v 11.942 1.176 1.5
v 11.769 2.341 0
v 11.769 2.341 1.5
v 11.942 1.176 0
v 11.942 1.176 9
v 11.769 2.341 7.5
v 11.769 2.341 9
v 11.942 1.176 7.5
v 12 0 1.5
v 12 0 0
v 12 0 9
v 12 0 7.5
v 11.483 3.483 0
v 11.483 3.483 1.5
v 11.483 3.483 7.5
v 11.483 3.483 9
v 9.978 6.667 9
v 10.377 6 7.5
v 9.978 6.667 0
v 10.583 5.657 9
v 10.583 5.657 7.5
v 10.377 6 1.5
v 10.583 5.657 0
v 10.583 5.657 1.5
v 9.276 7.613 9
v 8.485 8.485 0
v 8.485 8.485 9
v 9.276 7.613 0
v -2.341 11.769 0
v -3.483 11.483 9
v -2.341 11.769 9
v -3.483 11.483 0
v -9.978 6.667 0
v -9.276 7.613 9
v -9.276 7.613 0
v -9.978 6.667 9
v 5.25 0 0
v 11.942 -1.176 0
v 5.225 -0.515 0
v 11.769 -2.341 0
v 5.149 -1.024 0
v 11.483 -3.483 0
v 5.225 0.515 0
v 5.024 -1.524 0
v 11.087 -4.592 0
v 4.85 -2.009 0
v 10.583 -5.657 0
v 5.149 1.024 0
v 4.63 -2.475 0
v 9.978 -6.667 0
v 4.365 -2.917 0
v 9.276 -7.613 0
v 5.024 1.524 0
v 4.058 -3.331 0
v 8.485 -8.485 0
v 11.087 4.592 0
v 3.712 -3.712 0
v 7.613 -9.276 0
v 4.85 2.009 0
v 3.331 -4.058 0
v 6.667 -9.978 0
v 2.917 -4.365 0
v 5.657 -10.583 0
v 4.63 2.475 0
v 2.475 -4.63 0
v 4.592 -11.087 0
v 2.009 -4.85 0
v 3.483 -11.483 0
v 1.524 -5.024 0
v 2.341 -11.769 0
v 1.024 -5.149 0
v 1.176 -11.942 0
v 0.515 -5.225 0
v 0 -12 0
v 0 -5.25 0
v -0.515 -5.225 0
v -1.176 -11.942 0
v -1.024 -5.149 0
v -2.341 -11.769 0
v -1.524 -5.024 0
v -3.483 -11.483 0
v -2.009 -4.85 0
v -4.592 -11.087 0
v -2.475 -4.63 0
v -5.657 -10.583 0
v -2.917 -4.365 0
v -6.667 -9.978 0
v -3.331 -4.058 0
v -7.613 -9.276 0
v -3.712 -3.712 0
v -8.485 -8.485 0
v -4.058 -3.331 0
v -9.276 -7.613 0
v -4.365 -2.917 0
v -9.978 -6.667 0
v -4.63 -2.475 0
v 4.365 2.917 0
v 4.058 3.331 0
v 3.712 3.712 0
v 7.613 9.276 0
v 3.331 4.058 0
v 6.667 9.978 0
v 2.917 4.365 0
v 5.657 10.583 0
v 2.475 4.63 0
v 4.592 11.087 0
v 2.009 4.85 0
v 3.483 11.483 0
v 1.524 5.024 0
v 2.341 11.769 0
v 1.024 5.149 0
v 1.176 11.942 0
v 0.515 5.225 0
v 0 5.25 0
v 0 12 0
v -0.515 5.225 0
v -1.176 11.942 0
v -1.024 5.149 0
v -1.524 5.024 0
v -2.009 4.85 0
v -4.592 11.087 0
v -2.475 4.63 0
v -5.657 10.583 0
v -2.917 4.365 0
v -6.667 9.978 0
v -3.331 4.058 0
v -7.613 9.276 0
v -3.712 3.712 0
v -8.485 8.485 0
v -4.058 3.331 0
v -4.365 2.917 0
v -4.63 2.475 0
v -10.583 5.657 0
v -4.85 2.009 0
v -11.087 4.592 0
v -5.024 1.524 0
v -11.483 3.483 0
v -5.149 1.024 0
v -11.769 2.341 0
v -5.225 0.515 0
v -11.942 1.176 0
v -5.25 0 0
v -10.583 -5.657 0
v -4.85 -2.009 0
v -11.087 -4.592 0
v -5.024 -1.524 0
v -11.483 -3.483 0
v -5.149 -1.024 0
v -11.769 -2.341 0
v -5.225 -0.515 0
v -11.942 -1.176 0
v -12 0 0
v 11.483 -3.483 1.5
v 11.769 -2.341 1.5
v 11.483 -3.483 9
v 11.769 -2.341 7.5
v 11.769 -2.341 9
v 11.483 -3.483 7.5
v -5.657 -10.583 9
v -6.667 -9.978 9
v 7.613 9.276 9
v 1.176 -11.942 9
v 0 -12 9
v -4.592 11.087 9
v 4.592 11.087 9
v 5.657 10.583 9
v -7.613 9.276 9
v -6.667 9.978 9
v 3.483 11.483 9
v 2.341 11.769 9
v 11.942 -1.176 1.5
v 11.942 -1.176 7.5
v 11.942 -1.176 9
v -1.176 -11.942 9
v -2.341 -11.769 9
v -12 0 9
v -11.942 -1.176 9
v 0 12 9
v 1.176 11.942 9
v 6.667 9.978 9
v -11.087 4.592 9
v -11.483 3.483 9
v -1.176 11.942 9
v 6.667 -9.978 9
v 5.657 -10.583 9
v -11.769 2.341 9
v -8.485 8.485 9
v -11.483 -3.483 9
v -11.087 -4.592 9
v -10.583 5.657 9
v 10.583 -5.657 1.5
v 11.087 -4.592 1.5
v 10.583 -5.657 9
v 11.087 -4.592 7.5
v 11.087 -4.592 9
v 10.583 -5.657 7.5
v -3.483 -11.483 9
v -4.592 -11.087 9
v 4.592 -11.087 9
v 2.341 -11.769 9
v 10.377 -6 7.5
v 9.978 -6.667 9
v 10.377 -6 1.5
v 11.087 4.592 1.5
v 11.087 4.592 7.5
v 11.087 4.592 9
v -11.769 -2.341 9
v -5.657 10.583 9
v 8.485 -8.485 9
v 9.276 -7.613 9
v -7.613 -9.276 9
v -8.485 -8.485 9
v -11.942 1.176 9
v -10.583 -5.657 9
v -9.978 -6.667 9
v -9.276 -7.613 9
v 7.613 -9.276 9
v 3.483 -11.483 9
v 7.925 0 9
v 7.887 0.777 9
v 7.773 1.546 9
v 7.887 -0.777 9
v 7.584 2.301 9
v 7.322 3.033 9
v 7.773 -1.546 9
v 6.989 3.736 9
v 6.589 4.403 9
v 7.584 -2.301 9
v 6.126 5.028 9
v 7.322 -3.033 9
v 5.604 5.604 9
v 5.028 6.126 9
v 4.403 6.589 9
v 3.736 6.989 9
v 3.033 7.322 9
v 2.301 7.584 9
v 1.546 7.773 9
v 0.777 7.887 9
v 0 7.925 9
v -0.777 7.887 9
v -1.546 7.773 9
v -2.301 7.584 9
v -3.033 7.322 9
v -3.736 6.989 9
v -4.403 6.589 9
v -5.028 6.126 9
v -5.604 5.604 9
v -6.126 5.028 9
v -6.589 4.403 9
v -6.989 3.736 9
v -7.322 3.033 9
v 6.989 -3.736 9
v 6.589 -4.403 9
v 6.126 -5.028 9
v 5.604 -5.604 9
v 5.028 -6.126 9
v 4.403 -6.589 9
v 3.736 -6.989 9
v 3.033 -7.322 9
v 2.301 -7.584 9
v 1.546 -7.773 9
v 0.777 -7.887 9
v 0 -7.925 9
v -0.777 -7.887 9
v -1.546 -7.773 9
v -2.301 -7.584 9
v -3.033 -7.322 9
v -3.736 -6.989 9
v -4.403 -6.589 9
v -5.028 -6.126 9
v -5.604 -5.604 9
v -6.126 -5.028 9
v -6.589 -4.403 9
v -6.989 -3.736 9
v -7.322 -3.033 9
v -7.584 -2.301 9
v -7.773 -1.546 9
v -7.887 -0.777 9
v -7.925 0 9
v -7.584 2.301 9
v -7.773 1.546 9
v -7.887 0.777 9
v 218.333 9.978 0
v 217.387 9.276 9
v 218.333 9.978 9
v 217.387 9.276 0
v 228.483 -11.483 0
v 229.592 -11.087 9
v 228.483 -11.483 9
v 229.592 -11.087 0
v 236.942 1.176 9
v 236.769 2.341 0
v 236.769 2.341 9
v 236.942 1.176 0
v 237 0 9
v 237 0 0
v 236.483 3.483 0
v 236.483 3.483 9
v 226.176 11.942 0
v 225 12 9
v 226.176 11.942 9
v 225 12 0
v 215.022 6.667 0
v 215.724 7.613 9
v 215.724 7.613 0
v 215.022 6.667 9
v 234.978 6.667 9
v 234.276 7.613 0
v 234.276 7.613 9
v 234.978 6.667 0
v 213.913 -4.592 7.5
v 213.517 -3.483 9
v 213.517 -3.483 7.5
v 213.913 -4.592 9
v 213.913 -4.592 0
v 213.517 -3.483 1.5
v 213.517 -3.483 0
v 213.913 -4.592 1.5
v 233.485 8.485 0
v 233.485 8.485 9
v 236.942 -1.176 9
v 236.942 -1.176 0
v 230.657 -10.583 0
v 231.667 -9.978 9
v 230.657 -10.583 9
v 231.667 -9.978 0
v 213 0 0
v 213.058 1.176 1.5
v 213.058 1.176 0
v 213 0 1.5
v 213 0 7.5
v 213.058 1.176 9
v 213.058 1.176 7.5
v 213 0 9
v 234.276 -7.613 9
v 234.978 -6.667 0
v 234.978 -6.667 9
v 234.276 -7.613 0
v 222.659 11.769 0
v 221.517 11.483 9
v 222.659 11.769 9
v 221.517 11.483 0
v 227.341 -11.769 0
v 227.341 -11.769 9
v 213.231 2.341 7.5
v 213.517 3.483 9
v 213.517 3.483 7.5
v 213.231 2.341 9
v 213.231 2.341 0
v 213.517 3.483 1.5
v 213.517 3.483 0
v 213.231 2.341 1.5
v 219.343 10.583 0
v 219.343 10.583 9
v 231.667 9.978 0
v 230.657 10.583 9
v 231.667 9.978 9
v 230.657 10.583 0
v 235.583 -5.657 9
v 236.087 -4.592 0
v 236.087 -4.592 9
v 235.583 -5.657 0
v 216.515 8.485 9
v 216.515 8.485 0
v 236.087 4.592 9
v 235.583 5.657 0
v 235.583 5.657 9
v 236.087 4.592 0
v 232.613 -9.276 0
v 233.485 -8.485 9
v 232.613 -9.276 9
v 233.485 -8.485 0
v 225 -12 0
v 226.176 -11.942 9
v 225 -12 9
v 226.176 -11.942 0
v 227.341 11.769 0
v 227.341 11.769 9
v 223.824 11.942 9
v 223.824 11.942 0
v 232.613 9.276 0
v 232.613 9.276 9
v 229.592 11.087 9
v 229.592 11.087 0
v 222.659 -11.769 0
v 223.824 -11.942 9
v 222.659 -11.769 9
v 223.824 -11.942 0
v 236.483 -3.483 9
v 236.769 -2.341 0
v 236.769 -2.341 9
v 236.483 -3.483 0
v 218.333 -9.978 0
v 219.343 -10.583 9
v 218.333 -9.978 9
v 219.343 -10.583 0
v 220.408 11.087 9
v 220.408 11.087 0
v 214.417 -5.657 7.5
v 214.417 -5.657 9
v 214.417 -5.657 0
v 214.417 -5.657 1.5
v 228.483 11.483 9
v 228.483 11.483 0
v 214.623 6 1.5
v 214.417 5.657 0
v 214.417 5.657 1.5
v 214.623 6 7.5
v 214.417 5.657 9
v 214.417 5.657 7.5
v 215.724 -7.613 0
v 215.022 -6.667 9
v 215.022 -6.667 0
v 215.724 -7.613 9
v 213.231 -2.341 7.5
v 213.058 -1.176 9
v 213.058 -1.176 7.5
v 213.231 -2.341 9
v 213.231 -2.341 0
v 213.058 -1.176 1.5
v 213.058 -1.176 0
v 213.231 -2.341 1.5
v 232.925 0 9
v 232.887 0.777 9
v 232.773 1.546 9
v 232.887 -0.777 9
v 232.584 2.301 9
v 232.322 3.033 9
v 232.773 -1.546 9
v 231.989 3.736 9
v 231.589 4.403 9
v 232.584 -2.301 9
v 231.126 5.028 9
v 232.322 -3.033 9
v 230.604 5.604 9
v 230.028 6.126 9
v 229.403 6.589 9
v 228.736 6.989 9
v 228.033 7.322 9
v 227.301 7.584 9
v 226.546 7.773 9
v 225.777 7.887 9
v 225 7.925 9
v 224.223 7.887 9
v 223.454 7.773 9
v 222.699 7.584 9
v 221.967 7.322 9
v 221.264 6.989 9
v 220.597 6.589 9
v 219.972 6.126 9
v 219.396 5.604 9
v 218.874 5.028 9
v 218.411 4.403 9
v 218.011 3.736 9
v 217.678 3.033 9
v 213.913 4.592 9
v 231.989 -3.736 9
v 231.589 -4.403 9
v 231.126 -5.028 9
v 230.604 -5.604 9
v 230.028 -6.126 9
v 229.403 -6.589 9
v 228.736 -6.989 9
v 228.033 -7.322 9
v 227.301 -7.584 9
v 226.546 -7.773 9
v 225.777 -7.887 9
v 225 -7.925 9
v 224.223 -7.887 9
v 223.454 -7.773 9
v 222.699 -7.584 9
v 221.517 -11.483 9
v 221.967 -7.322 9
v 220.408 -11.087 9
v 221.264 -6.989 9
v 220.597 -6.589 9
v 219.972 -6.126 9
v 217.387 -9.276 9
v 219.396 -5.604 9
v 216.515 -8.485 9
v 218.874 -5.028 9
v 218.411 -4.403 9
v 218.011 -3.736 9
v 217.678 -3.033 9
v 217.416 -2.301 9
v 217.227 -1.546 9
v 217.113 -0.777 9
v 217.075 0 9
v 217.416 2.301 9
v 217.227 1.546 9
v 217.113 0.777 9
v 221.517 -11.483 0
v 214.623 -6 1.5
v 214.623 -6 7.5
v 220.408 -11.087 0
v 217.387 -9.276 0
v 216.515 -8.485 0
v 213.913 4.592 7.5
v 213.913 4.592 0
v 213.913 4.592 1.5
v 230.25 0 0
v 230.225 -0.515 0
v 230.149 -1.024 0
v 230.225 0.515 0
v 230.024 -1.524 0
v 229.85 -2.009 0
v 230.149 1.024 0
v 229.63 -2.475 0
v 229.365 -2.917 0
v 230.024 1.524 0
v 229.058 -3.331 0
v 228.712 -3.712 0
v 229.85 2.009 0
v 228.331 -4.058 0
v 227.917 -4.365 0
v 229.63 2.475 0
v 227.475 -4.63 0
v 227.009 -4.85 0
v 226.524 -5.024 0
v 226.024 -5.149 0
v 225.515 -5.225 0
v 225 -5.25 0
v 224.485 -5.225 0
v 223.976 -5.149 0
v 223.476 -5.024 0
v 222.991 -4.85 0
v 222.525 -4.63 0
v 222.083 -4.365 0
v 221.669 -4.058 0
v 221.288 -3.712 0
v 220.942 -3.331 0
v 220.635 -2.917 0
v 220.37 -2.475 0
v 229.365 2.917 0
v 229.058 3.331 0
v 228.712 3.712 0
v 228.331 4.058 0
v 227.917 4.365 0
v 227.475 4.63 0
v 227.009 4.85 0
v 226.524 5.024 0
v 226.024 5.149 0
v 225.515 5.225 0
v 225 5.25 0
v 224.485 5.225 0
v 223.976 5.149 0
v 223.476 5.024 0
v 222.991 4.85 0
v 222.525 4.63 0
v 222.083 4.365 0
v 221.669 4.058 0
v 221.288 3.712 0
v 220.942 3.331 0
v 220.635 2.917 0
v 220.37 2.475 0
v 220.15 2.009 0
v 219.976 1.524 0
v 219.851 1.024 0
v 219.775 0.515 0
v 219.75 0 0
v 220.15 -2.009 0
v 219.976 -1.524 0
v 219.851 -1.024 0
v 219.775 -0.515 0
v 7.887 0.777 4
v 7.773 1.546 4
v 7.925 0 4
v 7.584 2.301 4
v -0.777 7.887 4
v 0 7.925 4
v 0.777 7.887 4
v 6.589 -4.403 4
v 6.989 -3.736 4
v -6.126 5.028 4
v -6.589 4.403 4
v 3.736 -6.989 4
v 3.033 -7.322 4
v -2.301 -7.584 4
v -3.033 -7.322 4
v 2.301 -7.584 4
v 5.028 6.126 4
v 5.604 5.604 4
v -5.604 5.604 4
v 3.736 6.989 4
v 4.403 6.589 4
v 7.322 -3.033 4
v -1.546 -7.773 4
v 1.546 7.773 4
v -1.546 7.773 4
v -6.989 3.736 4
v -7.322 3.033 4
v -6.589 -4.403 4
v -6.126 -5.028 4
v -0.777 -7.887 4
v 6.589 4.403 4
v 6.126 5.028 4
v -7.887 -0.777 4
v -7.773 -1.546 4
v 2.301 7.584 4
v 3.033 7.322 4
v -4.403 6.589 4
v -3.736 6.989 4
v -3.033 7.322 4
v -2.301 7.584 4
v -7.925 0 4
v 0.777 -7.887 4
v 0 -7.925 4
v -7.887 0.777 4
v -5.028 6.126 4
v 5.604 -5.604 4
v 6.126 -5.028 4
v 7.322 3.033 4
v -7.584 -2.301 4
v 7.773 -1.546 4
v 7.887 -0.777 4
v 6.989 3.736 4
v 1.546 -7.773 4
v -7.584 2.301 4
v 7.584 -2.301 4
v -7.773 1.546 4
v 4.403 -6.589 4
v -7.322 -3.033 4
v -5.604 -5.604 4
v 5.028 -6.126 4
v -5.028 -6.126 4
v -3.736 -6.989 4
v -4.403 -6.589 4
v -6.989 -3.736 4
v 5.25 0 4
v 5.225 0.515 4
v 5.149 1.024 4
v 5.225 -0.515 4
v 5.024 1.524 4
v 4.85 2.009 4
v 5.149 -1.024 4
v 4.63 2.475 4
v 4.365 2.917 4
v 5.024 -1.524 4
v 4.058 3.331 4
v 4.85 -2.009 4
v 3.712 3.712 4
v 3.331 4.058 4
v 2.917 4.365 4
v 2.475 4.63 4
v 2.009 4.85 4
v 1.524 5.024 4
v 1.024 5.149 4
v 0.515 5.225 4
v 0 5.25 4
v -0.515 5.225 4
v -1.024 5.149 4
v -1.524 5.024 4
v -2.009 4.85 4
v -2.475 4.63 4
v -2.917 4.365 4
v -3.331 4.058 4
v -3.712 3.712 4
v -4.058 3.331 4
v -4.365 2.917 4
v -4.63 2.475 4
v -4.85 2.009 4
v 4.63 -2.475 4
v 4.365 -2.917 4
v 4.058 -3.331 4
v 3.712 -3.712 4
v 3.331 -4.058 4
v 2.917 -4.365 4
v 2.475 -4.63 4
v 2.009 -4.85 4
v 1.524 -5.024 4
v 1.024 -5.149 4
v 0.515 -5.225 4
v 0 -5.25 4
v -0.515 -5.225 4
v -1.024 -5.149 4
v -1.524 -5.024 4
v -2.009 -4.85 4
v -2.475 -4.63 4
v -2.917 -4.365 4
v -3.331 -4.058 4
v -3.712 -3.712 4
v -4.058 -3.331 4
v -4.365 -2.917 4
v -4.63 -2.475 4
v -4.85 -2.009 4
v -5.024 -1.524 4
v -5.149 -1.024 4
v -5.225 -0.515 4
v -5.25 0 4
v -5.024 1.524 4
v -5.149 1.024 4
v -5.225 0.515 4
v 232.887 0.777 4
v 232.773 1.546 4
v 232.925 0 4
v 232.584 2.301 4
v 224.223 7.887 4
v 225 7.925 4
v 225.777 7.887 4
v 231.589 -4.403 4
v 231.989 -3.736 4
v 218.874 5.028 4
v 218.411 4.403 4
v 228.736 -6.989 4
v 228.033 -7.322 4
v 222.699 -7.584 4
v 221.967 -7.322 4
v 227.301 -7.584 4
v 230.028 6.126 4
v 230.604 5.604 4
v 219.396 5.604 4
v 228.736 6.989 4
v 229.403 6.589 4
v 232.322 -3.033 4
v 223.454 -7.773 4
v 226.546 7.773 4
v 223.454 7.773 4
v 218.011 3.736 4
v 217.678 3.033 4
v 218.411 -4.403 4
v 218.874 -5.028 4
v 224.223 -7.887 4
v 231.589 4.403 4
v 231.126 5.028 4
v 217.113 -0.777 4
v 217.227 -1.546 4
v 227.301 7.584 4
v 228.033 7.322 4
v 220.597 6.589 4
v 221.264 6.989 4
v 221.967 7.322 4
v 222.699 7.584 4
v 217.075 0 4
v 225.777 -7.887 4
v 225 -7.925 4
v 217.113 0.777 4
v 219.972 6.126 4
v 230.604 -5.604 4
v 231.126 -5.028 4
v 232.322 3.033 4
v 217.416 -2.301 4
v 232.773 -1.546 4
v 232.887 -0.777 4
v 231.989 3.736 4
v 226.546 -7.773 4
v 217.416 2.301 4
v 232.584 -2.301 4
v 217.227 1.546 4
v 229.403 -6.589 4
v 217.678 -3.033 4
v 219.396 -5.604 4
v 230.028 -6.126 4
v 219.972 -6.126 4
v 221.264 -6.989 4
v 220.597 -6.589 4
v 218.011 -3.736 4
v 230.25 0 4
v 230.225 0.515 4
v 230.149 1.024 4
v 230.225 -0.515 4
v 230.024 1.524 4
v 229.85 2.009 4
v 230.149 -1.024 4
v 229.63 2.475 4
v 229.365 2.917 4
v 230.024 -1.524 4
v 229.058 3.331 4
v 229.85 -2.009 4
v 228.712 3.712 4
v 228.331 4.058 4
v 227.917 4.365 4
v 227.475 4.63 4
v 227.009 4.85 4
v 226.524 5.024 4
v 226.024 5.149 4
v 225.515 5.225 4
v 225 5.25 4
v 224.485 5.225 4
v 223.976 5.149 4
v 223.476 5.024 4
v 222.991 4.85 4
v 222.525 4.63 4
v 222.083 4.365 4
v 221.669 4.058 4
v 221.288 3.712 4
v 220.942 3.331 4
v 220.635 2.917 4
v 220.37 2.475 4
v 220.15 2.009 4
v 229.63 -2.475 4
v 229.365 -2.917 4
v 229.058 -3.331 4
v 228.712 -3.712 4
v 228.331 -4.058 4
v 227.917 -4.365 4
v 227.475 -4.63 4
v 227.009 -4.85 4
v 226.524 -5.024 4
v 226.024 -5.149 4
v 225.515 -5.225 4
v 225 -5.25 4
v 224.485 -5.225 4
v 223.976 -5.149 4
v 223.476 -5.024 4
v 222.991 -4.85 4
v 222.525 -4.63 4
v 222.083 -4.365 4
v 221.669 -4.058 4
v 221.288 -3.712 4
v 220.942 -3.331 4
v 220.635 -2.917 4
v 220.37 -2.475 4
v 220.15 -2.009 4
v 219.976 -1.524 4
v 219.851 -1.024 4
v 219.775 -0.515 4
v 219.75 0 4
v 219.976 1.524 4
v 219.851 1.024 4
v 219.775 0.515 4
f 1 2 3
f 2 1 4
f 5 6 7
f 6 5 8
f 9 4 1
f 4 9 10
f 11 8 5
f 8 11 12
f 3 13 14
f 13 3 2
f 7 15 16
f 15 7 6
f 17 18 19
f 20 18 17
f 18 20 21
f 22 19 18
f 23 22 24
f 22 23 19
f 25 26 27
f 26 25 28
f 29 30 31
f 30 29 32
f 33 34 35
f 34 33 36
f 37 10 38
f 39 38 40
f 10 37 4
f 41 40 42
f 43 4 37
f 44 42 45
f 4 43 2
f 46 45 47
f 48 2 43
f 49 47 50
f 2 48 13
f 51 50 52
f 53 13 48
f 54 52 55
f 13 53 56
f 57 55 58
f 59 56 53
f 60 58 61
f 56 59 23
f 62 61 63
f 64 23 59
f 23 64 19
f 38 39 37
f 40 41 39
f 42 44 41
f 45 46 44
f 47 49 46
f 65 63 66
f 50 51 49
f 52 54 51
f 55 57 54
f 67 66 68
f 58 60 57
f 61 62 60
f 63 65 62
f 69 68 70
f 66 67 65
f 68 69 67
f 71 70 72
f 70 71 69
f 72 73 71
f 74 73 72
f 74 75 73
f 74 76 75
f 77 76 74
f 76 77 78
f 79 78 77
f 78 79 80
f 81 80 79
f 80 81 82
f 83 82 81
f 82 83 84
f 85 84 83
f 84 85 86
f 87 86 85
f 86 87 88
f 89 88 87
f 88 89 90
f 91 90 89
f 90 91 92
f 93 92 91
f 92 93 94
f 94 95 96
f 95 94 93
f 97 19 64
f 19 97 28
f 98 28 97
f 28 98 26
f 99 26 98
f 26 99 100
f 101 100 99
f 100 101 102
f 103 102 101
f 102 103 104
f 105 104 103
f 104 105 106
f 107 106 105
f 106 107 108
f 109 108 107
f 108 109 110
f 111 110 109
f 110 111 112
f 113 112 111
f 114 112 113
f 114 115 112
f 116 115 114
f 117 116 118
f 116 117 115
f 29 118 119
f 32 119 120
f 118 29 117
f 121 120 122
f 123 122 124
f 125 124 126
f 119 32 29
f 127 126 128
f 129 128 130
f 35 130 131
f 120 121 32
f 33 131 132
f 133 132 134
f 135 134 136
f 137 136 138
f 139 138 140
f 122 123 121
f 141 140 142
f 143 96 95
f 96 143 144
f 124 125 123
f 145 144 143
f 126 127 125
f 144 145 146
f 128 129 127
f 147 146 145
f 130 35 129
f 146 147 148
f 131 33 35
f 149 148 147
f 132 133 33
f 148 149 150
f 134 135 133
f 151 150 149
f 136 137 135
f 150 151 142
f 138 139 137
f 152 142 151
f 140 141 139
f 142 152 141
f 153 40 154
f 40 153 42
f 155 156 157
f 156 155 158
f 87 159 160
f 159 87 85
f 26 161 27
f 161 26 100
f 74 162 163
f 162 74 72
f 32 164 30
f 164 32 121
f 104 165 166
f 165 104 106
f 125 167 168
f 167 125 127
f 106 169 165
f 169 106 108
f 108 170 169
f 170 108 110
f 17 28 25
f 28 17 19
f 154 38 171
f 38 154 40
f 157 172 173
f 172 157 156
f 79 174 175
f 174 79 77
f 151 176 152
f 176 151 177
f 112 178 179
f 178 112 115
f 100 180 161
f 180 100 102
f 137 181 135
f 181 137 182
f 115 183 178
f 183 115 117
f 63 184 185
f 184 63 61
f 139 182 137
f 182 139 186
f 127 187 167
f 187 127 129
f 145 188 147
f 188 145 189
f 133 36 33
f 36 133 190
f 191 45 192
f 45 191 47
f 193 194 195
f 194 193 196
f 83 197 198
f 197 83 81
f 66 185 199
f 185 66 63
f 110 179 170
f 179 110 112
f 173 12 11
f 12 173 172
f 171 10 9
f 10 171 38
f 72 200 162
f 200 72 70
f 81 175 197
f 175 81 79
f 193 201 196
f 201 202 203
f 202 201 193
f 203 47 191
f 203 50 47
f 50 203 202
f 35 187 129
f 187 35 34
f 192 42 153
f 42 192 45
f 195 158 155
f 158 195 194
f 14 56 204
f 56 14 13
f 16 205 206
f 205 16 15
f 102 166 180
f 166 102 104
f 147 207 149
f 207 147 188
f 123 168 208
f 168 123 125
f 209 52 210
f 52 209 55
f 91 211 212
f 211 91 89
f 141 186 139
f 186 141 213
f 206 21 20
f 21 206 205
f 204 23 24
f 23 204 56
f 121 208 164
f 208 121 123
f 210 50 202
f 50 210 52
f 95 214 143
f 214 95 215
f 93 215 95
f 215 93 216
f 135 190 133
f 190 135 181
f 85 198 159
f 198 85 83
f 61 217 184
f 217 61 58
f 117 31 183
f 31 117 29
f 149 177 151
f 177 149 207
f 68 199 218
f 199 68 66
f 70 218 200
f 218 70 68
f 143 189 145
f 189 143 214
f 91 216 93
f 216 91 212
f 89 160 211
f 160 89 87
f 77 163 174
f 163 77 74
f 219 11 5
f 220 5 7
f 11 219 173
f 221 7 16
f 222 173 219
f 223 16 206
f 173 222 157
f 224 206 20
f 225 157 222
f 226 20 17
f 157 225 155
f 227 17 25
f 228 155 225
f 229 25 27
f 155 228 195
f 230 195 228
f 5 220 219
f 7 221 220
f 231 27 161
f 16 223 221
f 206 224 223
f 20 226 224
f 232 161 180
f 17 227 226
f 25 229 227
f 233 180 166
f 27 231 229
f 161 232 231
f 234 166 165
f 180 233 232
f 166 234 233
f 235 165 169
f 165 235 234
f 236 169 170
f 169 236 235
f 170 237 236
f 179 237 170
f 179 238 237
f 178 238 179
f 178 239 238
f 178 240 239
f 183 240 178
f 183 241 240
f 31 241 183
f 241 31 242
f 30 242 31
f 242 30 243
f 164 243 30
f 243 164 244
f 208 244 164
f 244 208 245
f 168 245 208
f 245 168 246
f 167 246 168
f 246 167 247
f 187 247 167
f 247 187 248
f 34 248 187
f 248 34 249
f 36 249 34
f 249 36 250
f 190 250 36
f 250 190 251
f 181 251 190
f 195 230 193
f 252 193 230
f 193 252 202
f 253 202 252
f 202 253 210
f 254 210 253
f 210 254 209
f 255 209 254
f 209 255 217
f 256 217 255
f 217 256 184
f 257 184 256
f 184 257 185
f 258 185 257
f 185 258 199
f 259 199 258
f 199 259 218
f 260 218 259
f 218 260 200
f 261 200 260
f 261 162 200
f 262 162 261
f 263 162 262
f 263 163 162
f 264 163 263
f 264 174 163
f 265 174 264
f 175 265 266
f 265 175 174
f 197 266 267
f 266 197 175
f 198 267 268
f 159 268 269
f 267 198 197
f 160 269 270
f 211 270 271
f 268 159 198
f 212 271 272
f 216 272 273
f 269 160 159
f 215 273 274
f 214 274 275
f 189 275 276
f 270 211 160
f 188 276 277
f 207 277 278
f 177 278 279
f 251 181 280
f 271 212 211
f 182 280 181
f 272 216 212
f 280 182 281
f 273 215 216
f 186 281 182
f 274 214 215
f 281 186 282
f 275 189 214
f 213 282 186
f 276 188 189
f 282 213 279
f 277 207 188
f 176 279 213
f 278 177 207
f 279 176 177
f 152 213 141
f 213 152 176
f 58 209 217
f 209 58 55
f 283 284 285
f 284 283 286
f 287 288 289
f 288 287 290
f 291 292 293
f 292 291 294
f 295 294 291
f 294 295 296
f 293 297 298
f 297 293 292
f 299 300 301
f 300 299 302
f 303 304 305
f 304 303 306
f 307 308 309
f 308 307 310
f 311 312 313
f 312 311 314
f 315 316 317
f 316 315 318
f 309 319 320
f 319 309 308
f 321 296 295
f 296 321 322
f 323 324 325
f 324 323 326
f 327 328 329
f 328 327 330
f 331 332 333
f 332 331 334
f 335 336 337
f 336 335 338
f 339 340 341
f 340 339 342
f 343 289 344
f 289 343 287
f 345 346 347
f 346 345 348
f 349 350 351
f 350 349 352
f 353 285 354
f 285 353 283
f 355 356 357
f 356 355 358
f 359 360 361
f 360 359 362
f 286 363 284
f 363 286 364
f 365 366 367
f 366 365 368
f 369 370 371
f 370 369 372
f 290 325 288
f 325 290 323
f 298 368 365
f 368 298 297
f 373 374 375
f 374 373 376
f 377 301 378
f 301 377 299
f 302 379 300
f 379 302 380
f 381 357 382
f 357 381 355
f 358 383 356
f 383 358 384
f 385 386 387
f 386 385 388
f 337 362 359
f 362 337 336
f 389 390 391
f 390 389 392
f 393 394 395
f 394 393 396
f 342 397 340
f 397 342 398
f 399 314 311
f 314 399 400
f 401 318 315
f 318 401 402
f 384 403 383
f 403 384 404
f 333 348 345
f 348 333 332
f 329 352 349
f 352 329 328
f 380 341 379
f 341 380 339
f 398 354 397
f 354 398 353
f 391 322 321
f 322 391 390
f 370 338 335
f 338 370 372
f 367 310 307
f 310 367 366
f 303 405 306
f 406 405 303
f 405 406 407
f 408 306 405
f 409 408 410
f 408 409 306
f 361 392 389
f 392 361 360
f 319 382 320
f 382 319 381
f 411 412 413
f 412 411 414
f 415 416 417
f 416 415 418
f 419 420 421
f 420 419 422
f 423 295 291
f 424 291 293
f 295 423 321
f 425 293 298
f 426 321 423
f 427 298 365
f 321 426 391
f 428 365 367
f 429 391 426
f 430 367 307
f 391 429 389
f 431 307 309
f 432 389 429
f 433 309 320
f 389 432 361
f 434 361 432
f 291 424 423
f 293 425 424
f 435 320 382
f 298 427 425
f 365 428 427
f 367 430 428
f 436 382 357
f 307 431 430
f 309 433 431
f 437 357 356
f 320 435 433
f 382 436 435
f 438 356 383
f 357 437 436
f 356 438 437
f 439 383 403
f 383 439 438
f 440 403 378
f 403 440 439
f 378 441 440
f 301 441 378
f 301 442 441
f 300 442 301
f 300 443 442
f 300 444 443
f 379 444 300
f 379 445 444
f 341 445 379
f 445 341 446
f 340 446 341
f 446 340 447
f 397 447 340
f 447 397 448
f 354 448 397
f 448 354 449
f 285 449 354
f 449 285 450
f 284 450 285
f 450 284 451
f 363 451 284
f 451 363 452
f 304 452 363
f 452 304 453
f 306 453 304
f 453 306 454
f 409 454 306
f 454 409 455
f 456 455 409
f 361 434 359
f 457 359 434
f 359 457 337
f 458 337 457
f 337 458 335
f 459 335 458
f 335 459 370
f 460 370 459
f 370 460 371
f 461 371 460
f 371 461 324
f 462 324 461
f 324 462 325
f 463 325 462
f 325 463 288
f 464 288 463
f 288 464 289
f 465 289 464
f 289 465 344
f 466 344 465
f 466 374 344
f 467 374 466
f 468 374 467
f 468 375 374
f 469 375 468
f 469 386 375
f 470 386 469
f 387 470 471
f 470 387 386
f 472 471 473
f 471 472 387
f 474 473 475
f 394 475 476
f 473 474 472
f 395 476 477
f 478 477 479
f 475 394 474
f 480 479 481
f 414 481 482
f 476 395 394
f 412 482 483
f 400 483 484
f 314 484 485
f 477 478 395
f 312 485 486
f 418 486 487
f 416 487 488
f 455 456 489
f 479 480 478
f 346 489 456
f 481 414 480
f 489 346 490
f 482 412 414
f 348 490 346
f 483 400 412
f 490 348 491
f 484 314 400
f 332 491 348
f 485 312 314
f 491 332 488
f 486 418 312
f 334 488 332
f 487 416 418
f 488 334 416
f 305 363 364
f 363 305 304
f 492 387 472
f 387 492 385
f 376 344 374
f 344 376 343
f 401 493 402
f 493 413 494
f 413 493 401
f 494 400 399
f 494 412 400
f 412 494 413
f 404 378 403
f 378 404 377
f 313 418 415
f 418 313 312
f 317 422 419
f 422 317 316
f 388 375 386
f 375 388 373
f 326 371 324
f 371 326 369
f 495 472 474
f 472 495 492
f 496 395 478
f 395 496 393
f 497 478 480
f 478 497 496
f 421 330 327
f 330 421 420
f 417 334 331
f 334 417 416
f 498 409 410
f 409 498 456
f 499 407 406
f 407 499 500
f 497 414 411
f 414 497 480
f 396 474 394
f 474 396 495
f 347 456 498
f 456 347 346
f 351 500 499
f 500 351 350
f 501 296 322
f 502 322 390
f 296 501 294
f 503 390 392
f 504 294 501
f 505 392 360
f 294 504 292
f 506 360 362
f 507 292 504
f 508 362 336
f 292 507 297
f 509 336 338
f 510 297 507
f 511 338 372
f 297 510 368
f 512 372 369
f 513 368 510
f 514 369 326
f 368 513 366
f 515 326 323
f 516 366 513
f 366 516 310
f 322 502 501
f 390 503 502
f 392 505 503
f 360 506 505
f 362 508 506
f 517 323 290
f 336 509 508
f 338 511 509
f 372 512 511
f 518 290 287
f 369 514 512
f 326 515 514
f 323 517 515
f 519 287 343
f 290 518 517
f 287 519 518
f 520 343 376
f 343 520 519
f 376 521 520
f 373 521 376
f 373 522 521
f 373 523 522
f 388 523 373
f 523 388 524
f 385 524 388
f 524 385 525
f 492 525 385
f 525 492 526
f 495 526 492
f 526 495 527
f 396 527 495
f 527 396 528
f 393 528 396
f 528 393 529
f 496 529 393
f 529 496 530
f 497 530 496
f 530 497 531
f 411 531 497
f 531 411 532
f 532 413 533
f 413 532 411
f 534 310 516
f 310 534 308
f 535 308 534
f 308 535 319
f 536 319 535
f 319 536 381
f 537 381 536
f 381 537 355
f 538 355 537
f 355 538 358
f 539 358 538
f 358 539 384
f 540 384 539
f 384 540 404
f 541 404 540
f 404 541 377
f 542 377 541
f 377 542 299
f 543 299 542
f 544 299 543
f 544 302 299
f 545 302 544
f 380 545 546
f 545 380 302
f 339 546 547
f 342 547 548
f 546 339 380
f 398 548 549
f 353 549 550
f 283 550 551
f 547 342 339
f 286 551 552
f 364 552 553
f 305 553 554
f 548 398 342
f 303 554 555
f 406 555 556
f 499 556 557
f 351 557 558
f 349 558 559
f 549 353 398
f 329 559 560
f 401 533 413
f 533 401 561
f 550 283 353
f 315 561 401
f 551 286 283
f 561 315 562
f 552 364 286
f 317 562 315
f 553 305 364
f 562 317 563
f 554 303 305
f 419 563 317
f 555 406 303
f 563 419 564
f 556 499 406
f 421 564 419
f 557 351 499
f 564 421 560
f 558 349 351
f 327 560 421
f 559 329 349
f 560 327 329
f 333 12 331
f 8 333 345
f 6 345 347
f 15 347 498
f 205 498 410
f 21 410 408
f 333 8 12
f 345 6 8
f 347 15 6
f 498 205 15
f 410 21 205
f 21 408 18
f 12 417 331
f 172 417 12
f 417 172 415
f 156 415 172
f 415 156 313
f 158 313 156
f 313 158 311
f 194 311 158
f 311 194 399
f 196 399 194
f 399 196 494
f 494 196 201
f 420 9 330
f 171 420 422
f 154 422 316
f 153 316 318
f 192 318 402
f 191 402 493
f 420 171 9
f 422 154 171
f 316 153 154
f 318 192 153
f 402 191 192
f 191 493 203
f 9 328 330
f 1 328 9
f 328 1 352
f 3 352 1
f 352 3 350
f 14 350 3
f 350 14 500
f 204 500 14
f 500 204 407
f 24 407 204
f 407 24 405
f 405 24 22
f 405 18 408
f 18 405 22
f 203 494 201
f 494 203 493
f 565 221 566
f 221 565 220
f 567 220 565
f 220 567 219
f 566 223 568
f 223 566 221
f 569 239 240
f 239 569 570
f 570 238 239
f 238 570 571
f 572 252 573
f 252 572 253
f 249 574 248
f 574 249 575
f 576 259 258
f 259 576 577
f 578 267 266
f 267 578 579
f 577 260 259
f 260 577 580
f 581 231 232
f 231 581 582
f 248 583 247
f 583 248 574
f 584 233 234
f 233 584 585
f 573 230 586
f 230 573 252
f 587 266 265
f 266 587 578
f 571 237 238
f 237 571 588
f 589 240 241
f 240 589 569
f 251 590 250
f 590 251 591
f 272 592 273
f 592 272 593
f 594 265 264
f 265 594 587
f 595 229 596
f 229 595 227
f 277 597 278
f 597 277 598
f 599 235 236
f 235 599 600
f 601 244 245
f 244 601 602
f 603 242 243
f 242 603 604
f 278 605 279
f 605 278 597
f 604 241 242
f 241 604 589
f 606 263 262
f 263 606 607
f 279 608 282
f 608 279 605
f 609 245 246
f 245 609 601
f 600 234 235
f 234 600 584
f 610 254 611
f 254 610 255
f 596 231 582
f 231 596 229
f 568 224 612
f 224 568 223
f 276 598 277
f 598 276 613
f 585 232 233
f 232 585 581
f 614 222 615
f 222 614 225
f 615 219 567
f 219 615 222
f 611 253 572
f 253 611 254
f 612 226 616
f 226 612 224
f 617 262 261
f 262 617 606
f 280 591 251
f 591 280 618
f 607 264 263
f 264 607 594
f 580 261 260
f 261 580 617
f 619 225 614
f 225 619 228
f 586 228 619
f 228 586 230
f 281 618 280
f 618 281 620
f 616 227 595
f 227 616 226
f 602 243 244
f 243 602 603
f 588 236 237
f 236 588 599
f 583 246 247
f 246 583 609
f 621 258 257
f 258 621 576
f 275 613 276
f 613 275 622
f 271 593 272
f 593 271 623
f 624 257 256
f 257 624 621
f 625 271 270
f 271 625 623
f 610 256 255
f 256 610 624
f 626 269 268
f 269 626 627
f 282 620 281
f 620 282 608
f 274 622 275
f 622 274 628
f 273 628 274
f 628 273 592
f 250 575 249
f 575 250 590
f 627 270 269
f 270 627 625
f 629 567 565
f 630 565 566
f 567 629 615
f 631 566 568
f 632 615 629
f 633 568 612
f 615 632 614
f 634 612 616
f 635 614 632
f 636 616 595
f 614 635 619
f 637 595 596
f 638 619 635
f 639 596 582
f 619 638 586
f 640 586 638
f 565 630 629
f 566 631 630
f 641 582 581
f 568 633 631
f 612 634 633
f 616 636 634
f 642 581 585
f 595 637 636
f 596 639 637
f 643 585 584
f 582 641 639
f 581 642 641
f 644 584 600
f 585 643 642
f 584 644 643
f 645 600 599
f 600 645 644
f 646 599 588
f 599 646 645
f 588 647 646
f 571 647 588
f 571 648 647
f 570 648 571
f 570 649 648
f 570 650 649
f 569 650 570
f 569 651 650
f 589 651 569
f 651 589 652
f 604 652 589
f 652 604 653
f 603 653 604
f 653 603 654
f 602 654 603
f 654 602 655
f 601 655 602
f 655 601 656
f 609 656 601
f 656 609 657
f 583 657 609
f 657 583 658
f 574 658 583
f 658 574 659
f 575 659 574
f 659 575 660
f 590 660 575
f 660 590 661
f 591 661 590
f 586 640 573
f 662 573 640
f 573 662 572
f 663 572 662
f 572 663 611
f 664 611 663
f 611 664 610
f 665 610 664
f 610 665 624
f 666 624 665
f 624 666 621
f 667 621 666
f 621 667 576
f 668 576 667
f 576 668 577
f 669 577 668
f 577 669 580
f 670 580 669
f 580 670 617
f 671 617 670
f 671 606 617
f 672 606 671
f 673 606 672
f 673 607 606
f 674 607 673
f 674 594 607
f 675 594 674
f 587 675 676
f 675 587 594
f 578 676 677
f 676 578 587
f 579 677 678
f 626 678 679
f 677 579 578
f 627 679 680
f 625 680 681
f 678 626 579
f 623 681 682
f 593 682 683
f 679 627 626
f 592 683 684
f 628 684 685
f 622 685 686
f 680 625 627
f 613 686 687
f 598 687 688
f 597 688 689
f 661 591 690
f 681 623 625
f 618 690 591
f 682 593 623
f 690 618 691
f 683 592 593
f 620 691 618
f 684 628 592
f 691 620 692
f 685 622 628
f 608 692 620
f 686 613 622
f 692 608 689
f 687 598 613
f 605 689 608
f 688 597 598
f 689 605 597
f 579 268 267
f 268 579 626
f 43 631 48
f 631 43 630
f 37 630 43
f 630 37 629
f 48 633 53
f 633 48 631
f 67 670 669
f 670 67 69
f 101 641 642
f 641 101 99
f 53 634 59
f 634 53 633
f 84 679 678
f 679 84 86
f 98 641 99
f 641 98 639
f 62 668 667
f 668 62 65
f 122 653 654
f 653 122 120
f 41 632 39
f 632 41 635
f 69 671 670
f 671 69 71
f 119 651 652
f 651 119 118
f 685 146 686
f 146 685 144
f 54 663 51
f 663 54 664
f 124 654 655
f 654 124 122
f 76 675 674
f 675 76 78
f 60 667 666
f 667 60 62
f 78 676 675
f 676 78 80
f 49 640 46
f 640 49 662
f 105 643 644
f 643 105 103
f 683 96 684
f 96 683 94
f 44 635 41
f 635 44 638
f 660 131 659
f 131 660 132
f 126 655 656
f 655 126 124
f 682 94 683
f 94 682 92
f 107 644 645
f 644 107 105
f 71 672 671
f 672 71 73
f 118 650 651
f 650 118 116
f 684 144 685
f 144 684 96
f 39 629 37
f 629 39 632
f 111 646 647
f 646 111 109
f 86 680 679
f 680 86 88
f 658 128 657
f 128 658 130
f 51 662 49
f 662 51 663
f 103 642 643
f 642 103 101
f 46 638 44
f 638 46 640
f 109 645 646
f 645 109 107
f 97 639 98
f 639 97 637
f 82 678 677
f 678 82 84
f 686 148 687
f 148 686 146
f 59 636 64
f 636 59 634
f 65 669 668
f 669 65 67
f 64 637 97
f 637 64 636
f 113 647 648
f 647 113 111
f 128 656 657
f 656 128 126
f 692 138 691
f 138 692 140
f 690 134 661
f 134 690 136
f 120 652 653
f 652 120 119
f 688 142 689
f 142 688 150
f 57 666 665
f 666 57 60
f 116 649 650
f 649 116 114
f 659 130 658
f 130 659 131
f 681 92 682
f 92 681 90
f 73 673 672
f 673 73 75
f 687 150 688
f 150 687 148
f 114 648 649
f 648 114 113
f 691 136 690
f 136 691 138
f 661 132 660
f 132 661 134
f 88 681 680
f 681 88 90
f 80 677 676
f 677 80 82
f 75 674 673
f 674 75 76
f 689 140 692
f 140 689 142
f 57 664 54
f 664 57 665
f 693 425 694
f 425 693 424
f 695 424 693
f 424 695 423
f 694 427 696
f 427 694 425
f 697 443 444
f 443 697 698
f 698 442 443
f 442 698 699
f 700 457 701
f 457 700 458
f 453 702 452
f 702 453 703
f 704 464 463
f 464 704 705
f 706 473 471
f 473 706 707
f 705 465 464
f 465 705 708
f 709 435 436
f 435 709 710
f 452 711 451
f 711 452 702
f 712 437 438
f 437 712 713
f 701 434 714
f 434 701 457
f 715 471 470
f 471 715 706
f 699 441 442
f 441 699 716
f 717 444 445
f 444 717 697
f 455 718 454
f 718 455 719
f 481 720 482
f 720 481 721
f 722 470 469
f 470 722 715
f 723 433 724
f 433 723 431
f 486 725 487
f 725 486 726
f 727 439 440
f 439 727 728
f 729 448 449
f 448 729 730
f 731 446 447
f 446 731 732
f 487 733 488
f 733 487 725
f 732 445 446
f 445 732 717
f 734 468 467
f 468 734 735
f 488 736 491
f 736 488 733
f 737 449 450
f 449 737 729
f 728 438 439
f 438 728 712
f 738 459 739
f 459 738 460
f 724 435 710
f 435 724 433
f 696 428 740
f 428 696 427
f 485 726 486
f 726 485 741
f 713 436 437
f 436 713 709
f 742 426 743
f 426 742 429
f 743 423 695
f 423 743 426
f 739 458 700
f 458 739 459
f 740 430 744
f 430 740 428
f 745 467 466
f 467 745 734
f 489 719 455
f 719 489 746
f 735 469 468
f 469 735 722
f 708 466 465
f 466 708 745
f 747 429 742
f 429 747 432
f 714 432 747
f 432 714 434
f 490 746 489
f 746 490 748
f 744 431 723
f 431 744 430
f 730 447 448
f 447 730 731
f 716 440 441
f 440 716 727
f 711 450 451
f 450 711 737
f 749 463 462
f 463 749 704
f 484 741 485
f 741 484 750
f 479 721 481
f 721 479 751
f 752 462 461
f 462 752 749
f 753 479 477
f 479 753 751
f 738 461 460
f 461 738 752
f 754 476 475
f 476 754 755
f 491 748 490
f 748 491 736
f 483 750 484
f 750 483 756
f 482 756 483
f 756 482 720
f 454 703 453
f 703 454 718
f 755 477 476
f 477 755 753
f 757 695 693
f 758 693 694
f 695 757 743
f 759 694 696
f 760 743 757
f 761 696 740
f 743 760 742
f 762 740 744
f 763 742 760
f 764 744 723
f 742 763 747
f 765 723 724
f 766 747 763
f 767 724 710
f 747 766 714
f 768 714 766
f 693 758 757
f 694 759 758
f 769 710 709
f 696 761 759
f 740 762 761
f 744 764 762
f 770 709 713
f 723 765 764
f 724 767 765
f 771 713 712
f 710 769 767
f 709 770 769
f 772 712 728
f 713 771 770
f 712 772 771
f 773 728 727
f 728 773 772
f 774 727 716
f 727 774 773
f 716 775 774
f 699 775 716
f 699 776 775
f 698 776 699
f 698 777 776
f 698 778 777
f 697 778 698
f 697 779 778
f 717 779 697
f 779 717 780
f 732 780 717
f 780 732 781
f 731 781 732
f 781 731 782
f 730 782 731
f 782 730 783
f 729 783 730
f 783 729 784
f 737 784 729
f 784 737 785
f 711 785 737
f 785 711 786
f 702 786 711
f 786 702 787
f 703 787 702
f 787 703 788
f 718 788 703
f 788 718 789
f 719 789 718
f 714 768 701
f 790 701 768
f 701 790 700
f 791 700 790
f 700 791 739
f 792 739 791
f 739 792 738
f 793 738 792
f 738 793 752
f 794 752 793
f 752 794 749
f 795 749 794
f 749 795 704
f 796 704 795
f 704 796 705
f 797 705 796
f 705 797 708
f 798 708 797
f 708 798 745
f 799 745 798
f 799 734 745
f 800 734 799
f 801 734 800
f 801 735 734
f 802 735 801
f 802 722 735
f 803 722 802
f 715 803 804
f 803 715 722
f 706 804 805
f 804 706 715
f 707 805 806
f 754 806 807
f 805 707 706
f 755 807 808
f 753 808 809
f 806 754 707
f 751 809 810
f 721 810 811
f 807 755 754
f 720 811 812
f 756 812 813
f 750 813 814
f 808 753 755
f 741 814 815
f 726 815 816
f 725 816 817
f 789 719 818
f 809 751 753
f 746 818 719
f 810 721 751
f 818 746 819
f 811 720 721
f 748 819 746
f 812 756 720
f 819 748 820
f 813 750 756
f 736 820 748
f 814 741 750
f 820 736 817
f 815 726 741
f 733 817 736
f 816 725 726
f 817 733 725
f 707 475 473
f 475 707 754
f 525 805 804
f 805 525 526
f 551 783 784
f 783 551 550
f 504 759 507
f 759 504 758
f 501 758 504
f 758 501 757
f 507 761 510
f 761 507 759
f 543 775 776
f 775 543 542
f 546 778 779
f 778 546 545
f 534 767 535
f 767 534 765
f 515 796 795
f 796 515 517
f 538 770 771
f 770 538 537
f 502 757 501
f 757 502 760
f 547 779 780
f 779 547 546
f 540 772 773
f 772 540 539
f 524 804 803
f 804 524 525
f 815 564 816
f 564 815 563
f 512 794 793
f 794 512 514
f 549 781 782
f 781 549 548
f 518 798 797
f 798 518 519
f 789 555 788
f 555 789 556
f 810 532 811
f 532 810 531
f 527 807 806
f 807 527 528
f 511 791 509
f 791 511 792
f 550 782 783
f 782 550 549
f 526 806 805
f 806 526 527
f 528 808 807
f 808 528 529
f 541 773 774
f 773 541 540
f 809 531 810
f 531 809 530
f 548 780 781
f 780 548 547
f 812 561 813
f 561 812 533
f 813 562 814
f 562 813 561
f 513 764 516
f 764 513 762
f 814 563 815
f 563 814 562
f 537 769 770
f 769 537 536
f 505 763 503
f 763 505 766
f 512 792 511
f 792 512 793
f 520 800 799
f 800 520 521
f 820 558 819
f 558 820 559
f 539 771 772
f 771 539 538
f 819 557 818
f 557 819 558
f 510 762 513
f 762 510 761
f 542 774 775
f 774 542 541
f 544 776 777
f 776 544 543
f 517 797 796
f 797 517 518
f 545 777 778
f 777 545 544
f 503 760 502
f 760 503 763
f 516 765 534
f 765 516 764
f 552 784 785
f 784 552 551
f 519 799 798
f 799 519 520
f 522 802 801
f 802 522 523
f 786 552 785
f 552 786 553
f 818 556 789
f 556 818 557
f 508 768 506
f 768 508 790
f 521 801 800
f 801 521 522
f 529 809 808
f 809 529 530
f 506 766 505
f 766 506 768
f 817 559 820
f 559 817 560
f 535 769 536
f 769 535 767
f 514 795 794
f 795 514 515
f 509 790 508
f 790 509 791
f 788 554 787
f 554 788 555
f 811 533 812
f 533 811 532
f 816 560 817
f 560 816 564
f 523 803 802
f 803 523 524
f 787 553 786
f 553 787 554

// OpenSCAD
// file: ../lib/utils.scad
// 공통 모듈 (common modules) — 베어링 시트, 볼트 홀 등
include <../config/parameters.scad>

// 베어링 시트 (bearing seat): 압입 공차 적용 포켓
// brg = [내경, 외경, 폭] (예: BRG_608ZZ)
module bearing_seat(brg) {
    cylinder(d = brg[1] + bearing_press_fit, h = brg[2]);
}

// 베어링 시트 + 내륜 도피 홀 (관통)
// wall = 시트 아래 받침 두께
module bearing_pocket(brg, wall = 2) {
    union() {
        translate([0, 0, wall]) bearing_seat(brg);
        // 내륜 접촉 방지: 내경보다 크고 외경보다 작은 도피 홀
        cylinder(d = (brg[0] + brg[1]) / 2, h = wall + 0.1);
    }
}

// 관통 볼트 홀 (clearance hole)
module bolt_hole(d, h) {
    cylinder(d = d + bolt_hole_oversize, h = h);
}

// NEMA 17 모터 마운트 홀 패턴 (CON-004: SF24 = 42각 NEMA 17 호환)
// h = 판 두께
module nema17_mount(h) {
    union() {
        cylinder(d = nema17_pilot_d + clearance_fit, h = h);
        for (x = [-1, 1], y = [-1, 1])
            translate([x * nema17_hole_pitch / 2, y * nema17_hole_pitch / 2, 0])
                bolt_hole(nema17_bolt_d, h);
    }
}

// 숄더 볼트 피벗 홀 (CON-001)
// d = 숄더 직경 (shoulder_d_small | shoulder_d_large)
module pivot_hole(d, h) {
    cylinder(d = d + clearance_fit, h = h);
}

// 베어링 보스 (bearing boss): 출력물 허브에 베어링 내경 직접 안착 (CON-003)
// 내경 기준 압입 — bearing_press_fit(음수)만큼 키운다
module bearing_boss(brg, h) {
    cylinder(d = brg[0] - bearing_press_fit, h = h);
}

// 육각 너트 포켓 (nut pocket) — 차집합용. af = 평면폭(across flats)
module nut_pocket(af, t) {
    cylinder(d = (af + clearance_fit) / cos(30), h = t, $fn = 6);
}

// 리미트 스위치 장착 홀 쌍 (ELE-004) — 차집합용, X축 방향 피치
module ls_mount_holes(h) {
    for (x = [-1, 1])
        translate([x * ls_hole_pitch / 2, 0, 0])
            cylinder(d = ls_hole_d, h = h);
}

// 케이블 가이드 클립 (ELE-005) — 외면 부착형 C-클립, cable_d 다발 직경
module cable_clip(cable_d = 8, t = 4) {
    wall = 2.5;
    difference() {
        cylinder(d = cable_d + 2 * wall, h = t);
        translate([0, 0, -0.1]) cylinder(d = cable_d, h = t + 0.2);
        // 삽입 개구 (개구 폭 = 케이블 직경의 70%)
        translate([0, -cable_d * 0.35, -0.1])
            cube([cable_d, cable_d * 0.7, t + 0.2]);
    }
}

// 평행/구동 링크 바 (625ZZ 양단, MEC-002/MEC-001a)
// len = 피벗 간 거리. 보스 상면에서 베어링 압입, 하면 내륜 도피 홀.
module link_bar(len) {
    boss_t = BRG_625ZZ[2] + 4;
    difference() {
        union() {
            translate([0, -link_bar_w / 2, (boss_t - link_bar_t) / 2])
                cube([len, link_bar_w, link_bar_t]);
            for (x = [0, len])
                translate([x, 0, 0]) cylinder(d = link_boss_d, h = boss_t);
        }
        for (x = [0, len]) {
            translate([x, 0, boss_t - BRG_625ZZ[2]])
                bearing_seat([BRG_625ZZ[0], BRG_625ZZ[1], BRG_625ZZ[2] + 0.1]);
            translate([x, 0, -0.1])
                cylinder(d = (BRG_625ZZ[0] + BRG_625ZZ[1]) / 2, h = boss_t + 0.2);
        }
    }
}

// 지시선(leader) + 빌보드(billboard) 라벨 — 프리뷰용, $vpr 카메라 추종
// p = 앵커(부품 측), v = 지시선 벡터 (라벨은 p+v 위치)
// 주의: 상위 프레임이 회전된 경우 빌보드가 카메라를 향하지 않음 — 월드 프레임에서 호출할 것
module leader_label(p, v, txt, size = 3.2, col = "white") {
    color(col) {
        hull() {
            translate(p) sphere(d = 1.4, $fn = 12);
            translate(p + v) sphere(d = 1.4, $fn = 12);
        }
        translate(p + v) rotate($vpr) translate([2, -size / 2, 0])
            linear_extrude(0.6) text(txt, size = size);
    }
}

// 축 클램프 슬릿 + M3 핀치 볼트 (차집합용)
// bore_d = 클램프 보어, depth = 보어 깊이, body_d = 보스 외경
module shaft_clamp_cut(bore_d, depth, body_d) {
    union() {
        cylinder(d = bore_d + clearance_fit / 2, h = depth);
        // 슬릿
        translate([-1, 0, -0.1]) cube([2, body_d / 2 + 1, depth + 0.1]);
        // M3 핀치 볼트 (슬릿 직교) — 보어 반경과 보스 반경 사이
        translate([0, (bore_d / 2 + body_d / 2) / 2 + 1, depth / 2])
            rotate([0, 90, 0])
                translate([0, 0, -body_d / 2 - 1])
                    bolt_hole(3, body_d + 2);
    }
}
// file: ../config/parameters.scad
// cobot-lite 전역 파라미터 (global parameters)
// 모든 부품 치수는 이 파일에서만 정의한다 — 매직 넘버 하드코딩 금지 (MEC-008)

/* ===== 출력/렌더링 ===== */
$fn = 64;

/* ===== 공통 가공 여유 (파생 치수에서 참조 — 선행 정의 필수) ===== */
clearance_fit = 0.3;      // 회전/슬라이드 끼움 여유
bolt_hole_oversize = 0.4; // 관통 볼트 홀 여유

/* ===== 베어링 (bearing) — CON-002: 이 4종만 사용 =====
   [내경, 외경, 폭] mm */
BRG_608ZZ  = [8,  22, 7];   // 관절 피벗 (8mm 숄더 볼트)
BRG_625ZZ  = [5,  16, 5];   // 평행 링크 피벗 (5mm 숄더 볼트)
BRG_6805ZZ = [25, 37, 7];   // 손목 롤 축, 중구경 허브
BRG_6810ZZ = [50, 65, 7];   // 베이스 턴테이블 메인 베어링

// 베어링 압입 공차 (press-fit tolerance) — MFG-002
// 외경 기준 -0.1 ~ -0.2mm. 프린터별 보정은 이 변수 하나로 조정한다.
bearing_press_fit = -0.15;

/* ===== 숄더 볼트 (stripper/shoulder bolt) — CON-001 ===== */
shoulder_d_small = 5;   // 625ZZ 결합
shoulder_d_large = 8;   // 608ZZ 결합

/* ===== 링크 길이 — MEC-006 [TBD-4] =====
   리치 500mm 잠정. 비대칭 분할 (J2 자중 부담 보상, MEC-001a 분담 구조) */
L1 = 225;   // 상완 (upper arm): J2 축 → J3 축
L2 = 275;   // 하완 (forearm): J3 축 → 공구 플랜지

/* ===== 링크 꺾임 (팔레타이저식 구조 오프셋) =====
   관절 축 좌표는 불변(직선 L1/L2 기준) — 꺾임은 빔 형상만 변경.
   목적: ① 신장/접힘 한계 자세에서 빔-빔 간섭 여유 확보
        ② 구조 외곽을 축선 위로 올려 저자세 작업 시 팔꿈치 하부 돌출 감소
   니(knee) 수직 오프셋 h = L·pos·(1-pos)·tan(deg) */
ua_bend_deg = 12;     // 상완 꺾임각 (0 = 직선)
ua_bend_pos = 0.68;   // 꺾임 위치 (0~1, J2 기준) — 분할 조인트(95~131) 뒤
fa_bend_deg = 12;     // 하완 꺾임각
fa_bend_pos = 0.5;    // 꺾임 위치 (팔꿈치 기준)

/* ===== 가동 엔벨로프 (소프트 리미트 권고값 — docs/design-notes.md) =====
   접힘각 = J3 - J2 (월드 피치 차).
   -90° = 평행사변형 구동 전동각(transmission angle) 특이점 (크랭크∥링크),
     0° = 완전 신장 특이점 (J2·J3·손목 일직선). 양쪽 모두 운용 금지 */
env_fold_min = -75;   // 접힘 한계 (전동각 sin25° ≈ 0.42 이상 확보)
env_fold_max = -3;    // 신장 한계 (리치 ≈ 499.5mm — 공칭 500 대비 -0.5)

// J3 모터 후방 배치 연장 길이 (MEC-001c)
// J2 액추에이터는 J2 축 동축 직결 (MEC-001b) — 후방 배치 대상은 J3 어셈블리만
// J1 회전 시 베이스·작업물 간섭 확인 필수
rear_extension = 80;    // J2 피벗 → J3 모터+기어박스 어셈블리 중심 [잠정]

/* ===== 턴테이블 (turntable) — MEC-003 ===== */
turntable_bearing_gap = 30;   // 6810ZZ 2개 축방향 이격, 30mm 이상 (SHOULD)

/* ===== 모터 (motor) — CON-004: 산요덴키 SF24 시리즈 =====
   NEMA 17 호환 42각 */
motor_frame = 42;             // 프레임 폭 (mm)
nema17_hole_pitch = 31;       // 고정 볼트 피치
nema17_pilot_d = 22;          // 센터 파일럿 직경
nema17_bolt_d = 3;            // M3

/* ===== 감속비 (gear ratio) — CON-005: 5/10/20만 허용 ===== */
// 주의: MG17-G10(10:1)은 허용 토크 5N·m로 급락 — 변경 시 토크 재검증 (docs/torque-budget.md)
ratio_J1 = 20;
ratio_J2 = 20;
ratio_J3 = 20;   // SF2423 + 20:1 확정 (TBD-3 해결)
ratio_J4 = 5;

/* ===== 기어박스 (gearbox) — MG17 데이터시트 (docs/tbd-research.md TBD-5) ===== */
gbx_frame = 42;            // NEMA 17 플랜지, 모터와 동일 42각
gbx_len_20to1 = 51;        // MG17-G20 길이 (J1~J3)
gbx_len_5to1  = 40;        // MG17-G5 길이 (J4)
gbx_out_shaft_d = 8;       // 출력축 직경
gbx_in_insert = 9.5;       // 입력 결합 깊이 — SF24 축 길이 호환 확인 항목
gbx_mass_20to1 = 400;      // g — 질량 예산 계산용
gbx_mass_5to1  = 350;      // g

/* ===== 모터 몸체 치수 — SF24 카탈로그 일반값 [잠정: 구매 데이터시트로 확인] ===== */
motor_len_SF2424 = 47;    // J1, J2
motor_len_SF2423 = 39;    // J3
motor_len_SF2422 = 33;    // J4
motor_shaft_d = 5;        // SF24 출력축 (MG17 입력 클램프 ⌀5)
gbx_out_shaft_len = 20;   // MG17 출력축 돌출 길이

/* ===== 베이스/J1 (MEC-003, MEC-005) ===== */
base_plate_size = 140;    // 정사각 베이스 플레이트 한 변
base_plate_t = 8;
base_bolt_d = 5;          // M5 ×4 작업대 고정 (MEC-005)
base_bolt_pitch = 120;    // 고정 볼트 피치
base_col_wall = 5;        // 턴테이블 칼럼 벽 두께
col_window_w = 50;        // 칼럼 측면 배선/조립 창 폭
turntable_top_d = 100;    // 턴테이블 상판 직경
turntable_top_t = 8;
j1_actuator_gap = 4;      // 베이스 플레이트 상면 → 모터 하면 여유
col_open_h = 24;          // 모터 플로어 상면 → 하부 베어링 (스템 결합·셋스크류 존)
j1_stem_d = 20;           // 턴테이블 허브 스템(출력축 결합부) 외경
set_screw_pilot_d = 3.4;  // M4 무두 볼트(set screw) 셀프태핑 파일럿
m3_tap_d = 2.8;           // M3 셀프태핑 파일럿 (앵커 등 소형 체결)
shoulder_mount_px = 80;   // 어깨 텅 ↔ 턴테이블 볼트 피치 X
shoulder_mount_py = 50;   // 어깨 텅 ↔ 턴테이블 볼트 피치 Y
shoulder_mount_bolt_d = 5;// M5 ×4
shoulder_tongue_x = 40;   // 어깨 텅 깊이(X) — 포크 내 스윕 간섭 한계 결정 (J2 ≈ ±55°)

/* ===== 암 단면/관절 (MEC-004) — v0.13 플레이트 아키텍처 =====
   원칙: 출력물은 평판(plate)만. 간격은 표준 스페이서 튜브 + 관통 볼트가
   결정 (일체 보스·웹·박스 금지). 관절 베어링은 플레이트에 직접 압입 —
   플레이트 두께 = 608ZZ 폭(7) */
arm_plate_t = 7;          // 측판 두께 = 608ZZ 폭 (베어링 인-플레이트 압입)
fork_standoff_len = 30;   // 표준 육각 스탠드오프 길이 (어깨 포크 갭 = 하완 내폭)
hex_standoff_af = 13;     // 두꺼운 육각 스탠드오프 평면폭 (M6 암-암)
joint_spacer_od = 12;     // 관절 스택 스페이서 튜브 외경 (숄더 ⌀8 위)
ua_split_x = 115;         // 상완 플레이트 분할선 (365 > 빌드 대각 한계)
ua_splice = [99, 131];    // 스플라이스 더블러 볼트 X 위치 (분할선 ±16)
// 어깨 텅(플레이트 스택) 폭 = 플레이트 14 ×2 + 표준 스탠드오프 30 (v0.13)
tongue_w = 28 + fork_standoff_len;          // 58
// 상완 포크 내폭 = 표준 육각 스탠드오프 L60 (전 스탠드오프 표준화 — v0.14).
// 텅 58과의 편차 1mm/측은 J2 스택 M8 와셔가 흡수 (CON-001 와셔 기존 품목)
arm_inner_w = 60;
arm_h = 50;               // 암 단면 높이
j2_axis_h = 90;           // 턴테이블 상면 → J2 축 높이
                          // — J2 +45° 시 후방 러그 하단 ↔ 어깨 플랜지 간섭 회피 (간섭 검사 확인)
j3_crank_len = 40;        // J3 크랭크 = 하완 혼 반경 (평행사변형 1:1)
pl_offset = 45;           // 수동 평행사변형(MEC-002) 피벗 오프셋
                          // — J2 모터 42각 코너 스윕 반경(≈30) + 여유
forearm_inner_w = fork_standoff_len;  // 하완 측판 내폭 = 표준 스탠드오프 30 (v0.13)
beam_w = 40;              // 상완/하완 중앙 보(beam) 폭
arm_lug_r = 26;           // 관절 러그(피벗 보스) 반경 — NEMA17 볼트 코너(r≈21.9) + 벽
beam_wall = 4;            // 보 쉘 벽 두께 (경량화)
pivot_engage = 14;        // 축 클램프/베어링 물림 깊이
crank_t = 8;              // J3 크랭크 암 두께
crank_hub_d = 20;         // 크랭크 허브 외경
crank_hub_w = 12;         // 크랭크 허브 폭
dl_offset = 8;            // 구동 링크 평면: 플레이트 A 외면 → 링크 중심 거리
ua_joint_x = 95;          // 상완 분할 조인트 위치 (MFG-004: 365mm > 빌드 대각 한계)
ua_lap = 36;              // 랩 조인트(소켓-테논) 물림 길이

/* ===== 너트 평면폭 (across flats) ===== */
m3_nut_af = 5.5;
m4_nut_af = 7;
m6_nut_af = 10;
link_bar_w = 12;          // 링크 바 단면 폭
link_bar_t = 6;           // 링크 바 단면 두께
link_boss_d = 24;         // 링크 단부 625ZZ 보스 외경 (625 외경 16 + 벽 4×2)

/* ===== 손목/공구 플랜지 (GEN-004) ===== */
wrist_offset = 50;        // 손목 피치 피벗 → J4(플랜지) 축 수평 오프셋
                          // — J4 모터 몸체 ↔ 하완 러그 스윕 간섭 회피 (≥ lug_r + 모터 반폭)
forearm_len = L2 - wrist_offset; // 팔꿈치 축 → 손목 피치 피벗
wrist_wall = 5;           // 손목 하우징 벽 두께
flange_d = 45;            // 공구 플랜지 직경
flange_t = 8;
flange_bc = 32;           // 그리퍼 볼트 서클
flange_bolt_d = 4;        // M4 ×4

/* ===== 리미트 스위치 (ELE-004) — KW12형 기계식 마이크로 기준품 ===== */
ls_body = [20, 10, 6.5];  // 몸체 [길이, 높이, 두께]
ls_hole_pitch = 9.5;      // 장착 홀 피치
ls_hole_d = 2.3;          // M2 셀프태핑/볼트

/* ===== 질량 산출 (MEC-007, docs/mass-budget.md) ===== */
petgcf_density = 1.30;    // g/cm³ (PETG-CF 카탈로그 일반값)
print_solidity = 0.6;     // 쉘+인필 유효 충전율 [잠정 — 슬라이서 추정으로 대체]
motor_mass_SF2424 = 510;  // g (산요 카탈로그 확정)
motor_mass_SF2423 = 380;
motor_mass_SF2422 = 300;

/* ===== 질량/성능 예산 ===== */
payload = 1.0;            // kg, 그리퍼 포함 정격 (PER-001)
moving_mass_budget = 0.8; // kg, 상완 이후 이동부 상한 (MEC-007)

/* ===== 출력 제약 — MFG-004 (Creality SparkX i7, TBD-8 해결) ===== */
build_volume = [260, 260, 255];
// main file
// 수동 평행사변형 링크 2 (passive parallelogram link, stage 2) — MEC-002
// 로커 핀 ↔ 손목 혼 핀. 길이 = forearm_len (하완과 평행).
include <../config/parameters.scad>
use <../lib/utils.scad>

link_bar(forearm_len);
